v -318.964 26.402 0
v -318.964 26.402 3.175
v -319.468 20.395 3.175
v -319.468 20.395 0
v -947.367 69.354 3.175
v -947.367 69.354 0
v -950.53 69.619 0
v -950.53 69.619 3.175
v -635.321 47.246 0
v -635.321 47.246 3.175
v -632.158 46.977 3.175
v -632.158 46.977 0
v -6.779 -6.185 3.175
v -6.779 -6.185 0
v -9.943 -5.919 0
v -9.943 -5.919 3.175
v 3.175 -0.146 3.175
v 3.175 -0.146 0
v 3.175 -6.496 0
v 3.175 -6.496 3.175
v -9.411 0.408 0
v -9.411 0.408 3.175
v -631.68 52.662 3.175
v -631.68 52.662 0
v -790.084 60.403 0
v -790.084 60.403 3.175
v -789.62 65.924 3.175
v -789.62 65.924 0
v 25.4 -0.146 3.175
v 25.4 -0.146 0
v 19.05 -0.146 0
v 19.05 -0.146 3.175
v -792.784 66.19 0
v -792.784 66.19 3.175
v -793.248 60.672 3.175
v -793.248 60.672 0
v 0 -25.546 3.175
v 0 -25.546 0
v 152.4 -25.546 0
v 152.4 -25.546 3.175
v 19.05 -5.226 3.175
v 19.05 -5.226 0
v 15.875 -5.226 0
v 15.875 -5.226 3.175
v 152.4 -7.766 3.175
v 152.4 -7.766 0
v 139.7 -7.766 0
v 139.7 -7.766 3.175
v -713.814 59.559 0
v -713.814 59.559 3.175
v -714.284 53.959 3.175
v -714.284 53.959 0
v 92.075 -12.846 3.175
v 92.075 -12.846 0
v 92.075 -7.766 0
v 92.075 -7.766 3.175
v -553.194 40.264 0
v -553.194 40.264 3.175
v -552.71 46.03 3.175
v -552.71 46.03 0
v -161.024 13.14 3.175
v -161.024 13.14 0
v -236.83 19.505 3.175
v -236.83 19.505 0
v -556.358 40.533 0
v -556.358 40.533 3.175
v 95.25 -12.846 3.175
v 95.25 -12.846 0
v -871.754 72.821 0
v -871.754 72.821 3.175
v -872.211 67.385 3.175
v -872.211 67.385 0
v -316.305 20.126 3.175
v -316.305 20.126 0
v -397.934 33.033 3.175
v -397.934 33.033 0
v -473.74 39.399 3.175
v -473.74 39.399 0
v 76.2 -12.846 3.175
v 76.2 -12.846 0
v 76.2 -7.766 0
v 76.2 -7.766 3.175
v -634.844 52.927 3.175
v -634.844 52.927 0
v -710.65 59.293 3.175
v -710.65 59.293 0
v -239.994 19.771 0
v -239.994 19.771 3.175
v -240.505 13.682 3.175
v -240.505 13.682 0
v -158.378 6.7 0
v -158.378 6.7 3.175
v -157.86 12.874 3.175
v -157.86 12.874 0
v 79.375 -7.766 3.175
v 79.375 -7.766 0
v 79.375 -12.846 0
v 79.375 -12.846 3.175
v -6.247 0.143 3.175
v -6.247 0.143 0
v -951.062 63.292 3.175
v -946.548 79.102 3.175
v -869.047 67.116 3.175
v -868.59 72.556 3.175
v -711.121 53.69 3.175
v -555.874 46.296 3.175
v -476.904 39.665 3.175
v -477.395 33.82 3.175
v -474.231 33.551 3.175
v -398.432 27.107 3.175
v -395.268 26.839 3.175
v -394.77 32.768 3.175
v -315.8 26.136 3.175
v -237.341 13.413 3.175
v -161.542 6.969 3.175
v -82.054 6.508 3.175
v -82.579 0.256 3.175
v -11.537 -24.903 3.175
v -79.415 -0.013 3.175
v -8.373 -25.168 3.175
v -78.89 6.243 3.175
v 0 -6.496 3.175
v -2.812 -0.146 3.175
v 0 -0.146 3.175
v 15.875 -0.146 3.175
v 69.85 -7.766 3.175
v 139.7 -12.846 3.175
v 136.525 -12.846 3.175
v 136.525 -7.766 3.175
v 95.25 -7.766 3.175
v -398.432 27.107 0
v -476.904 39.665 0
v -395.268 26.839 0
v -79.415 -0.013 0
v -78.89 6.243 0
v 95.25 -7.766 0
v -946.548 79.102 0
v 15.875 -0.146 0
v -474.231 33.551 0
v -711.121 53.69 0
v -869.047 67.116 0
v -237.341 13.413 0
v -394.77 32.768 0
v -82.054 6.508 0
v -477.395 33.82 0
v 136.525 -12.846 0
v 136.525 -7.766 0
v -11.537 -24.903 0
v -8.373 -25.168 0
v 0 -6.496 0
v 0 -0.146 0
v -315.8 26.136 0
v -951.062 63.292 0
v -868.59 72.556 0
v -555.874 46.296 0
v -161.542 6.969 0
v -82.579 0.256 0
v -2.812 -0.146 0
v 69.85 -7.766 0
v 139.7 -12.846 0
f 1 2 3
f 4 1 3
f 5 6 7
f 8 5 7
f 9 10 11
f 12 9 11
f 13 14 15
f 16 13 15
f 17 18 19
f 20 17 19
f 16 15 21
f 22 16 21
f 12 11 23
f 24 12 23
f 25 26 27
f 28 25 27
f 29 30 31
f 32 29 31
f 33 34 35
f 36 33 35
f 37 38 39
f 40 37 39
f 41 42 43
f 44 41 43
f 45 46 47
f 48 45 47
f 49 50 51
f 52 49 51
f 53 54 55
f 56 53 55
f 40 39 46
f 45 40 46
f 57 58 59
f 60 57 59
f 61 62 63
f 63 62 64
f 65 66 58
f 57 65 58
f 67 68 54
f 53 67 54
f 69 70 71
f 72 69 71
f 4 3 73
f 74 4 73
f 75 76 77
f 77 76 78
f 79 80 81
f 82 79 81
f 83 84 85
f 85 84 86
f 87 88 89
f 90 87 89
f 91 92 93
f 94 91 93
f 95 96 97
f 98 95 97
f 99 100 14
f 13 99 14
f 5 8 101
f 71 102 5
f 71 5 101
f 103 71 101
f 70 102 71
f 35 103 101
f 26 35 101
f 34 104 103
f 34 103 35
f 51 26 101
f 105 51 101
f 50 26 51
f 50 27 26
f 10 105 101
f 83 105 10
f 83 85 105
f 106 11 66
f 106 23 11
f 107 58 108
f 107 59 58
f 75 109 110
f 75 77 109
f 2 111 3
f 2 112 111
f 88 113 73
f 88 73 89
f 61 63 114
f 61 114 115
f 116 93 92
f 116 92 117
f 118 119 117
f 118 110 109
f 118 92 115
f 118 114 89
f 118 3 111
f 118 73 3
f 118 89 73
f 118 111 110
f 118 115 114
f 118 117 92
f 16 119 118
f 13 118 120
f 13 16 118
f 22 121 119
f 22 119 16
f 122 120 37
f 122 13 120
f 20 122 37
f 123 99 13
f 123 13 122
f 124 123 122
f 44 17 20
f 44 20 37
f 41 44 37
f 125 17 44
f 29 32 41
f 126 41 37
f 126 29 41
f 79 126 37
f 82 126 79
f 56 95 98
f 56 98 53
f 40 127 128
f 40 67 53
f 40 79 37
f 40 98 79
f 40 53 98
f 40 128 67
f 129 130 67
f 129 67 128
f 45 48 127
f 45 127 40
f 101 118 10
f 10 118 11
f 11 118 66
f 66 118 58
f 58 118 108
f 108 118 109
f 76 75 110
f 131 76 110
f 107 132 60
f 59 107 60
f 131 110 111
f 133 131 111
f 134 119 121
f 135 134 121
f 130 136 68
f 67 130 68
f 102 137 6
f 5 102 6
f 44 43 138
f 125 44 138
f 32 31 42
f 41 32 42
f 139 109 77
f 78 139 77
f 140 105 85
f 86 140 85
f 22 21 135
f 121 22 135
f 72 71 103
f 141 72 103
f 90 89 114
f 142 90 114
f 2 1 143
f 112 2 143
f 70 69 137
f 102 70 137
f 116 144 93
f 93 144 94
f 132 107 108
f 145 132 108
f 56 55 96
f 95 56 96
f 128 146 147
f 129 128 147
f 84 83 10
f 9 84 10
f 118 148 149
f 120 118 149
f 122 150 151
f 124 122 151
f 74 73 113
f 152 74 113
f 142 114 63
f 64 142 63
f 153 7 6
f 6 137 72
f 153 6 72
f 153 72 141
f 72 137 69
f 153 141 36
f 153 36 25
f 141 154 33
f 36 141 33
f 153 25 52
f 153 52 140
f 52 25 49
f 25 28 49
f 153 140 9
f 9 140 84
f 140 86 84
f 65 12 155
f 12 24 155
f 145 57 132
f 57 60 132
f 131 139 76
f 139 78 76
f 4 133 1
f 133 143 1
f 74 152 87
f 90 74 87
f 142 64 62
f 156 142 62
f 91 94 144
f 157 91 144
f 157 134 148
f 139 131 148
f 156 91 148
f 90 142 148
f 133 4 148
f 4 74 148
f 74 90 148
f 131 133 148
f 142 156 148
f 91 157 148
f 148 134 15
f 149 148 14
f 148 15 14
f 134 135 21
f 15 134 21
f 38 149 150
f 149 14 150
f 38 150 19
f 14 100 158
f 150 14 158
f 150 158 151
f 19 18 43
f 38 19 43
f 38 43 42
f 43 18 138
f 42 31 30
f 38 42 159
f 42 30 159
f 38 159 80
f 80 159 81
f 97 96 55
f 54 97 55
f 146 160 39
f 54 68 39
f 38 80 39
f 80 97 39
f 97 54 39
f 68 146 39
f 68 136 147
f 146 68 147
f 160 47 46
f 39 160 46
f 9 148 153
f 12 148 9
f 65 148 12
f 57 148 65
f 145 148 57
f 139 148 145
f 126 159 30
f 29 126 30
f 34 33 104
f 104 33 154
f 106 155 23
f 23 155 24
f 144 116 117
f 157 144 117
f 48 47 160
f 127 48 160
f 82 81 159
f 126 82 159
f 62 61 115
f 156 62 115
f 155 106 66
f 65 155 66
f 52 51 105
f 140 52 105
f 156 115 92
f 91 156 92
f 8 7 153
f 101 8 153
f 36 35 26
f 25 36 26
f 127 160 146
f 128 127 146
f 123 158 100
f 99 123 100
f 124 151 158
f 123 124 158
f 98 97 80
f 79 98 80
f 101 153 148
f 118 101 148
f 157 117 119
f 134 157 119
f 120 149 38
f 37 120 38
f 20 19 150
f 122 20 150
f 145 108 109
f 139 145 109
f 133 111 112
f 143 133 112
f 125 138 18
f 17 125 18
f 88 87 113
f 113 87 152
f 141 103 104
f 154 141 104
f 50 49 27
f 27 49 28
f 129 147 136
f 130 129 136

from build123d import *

# Parameters (mm, degrees)
BOSS_EXTRUDE1_DEPTH = 3.175
CUT_EXTRUDE1_DEPTH  = 4.175


with BuildPart() as part:
    # Sketch1 → Boss-Extrude1 (new body)
    with BuildSketch(Plane.XY):
        Polygon((-950.530495659, 69.619322302), (-951.061849964, 63.291592645), (-11.536706102, -24.902638492), (-8.372841274, -25.168315645), (0, -25.545856054), (152.4, -25.545856054), (152.4, -7.765856054), (139.7, -7.765856054), (139.7, -12.845856054), (136.525, -12.845856054), (136.525, -7.765856054), (95.25, -7.765856054), (95.25, -12.845856054), (92.075, -12.845856054), (92.075, -7.765856054), (79.375, -7.765856054), (79.375, -12.845856054), (76.2, -12.845856054), (76.2, -7.765856054), (69.85, -7.765856054), (25.4, -0.145856054), (19.05, -0.145856054), (19.05, -5.225856054), (15.875, -5.225856054), (15.875, -0.145856054), (3.175, -0.145856054), (3.175, -6.495856054), (0, -6.495856054), (0, -0.145856054), (-2.81225704, -0.145856054), (-6.247424053, 0.14260298), (-6.778778359, -6.185126677), (-9.942643187, -5.919449524), (-9.411288881, 0.408280132), (-946.54805097, 79.101852726), (-947.366630831, 69.353645149), align=None)
    extrude(amount=BOSS_EXTRUDE1_DEPTH)

    # Sketch2 → Cut-Extrude1 (cut, through all)
    with BuildSketch(Plane.XY.offset(3.175)):
        Polygon((-79.415081651, -0.013332249), (-78.889760507, 6.242550403), (-82.053625335, 6.508227555), (-82.578671745, 0.255616625), align=None)
        Polygon((-158.378290396, 6.699631648), (-157.859826617, 12.873852131), (-161.023691445, 13.139529284), (-161.54188049, 6.968580522), align=None)
        Polygon((-237.341499142, 13.412595546), (-236.829892727, 19.50515386), (-239.993757555, 19.770831012), (-240.505089236, 13.68154442), align=None)
        Polygon((-316.304707888, 20.125559443), (-315.799958836, 26.136455588), (-318.963823664, 26.402132741), (-319.468297982, 20.394508317), align=None)
        Polygon((-395.267916634, 26.83852334), (-394.770024946, 32.767757316), (-397.933889774, 33.033434469), (-398.431506728, 27.107472214), align=None)
        Polygon((-474.23112538, 33.551487238), (-473.740091056, 39.399059045), (-476.903955884, 39.664736197), (-477.394715474, 33.820436112), align=None)
        Polygon((-553.194334126, 40.264451135), (-552.710157166, 46.030360773), (-555.874021994, 46.296037926), (-556.35792422, 40.533400009), align=None)
        Polygon((-632.157542872, 46.977415032), (-631.680223276, 52.661662502), (-634.844088104, 52.927339654), (-635.321132966, 47.246363906), align=None)
        Polygon((-711.120751618, 53.69037893), (-710.650289385, 59.29296423), (-713.814154213, 59.558641383), (-714.284341712, 53.959327804), align=None)
        Polygon((-790.083960364, 60.403342827), (-789.620355495, 65.924265958), (-792.784220323, 66.189943111), (-793.247550458, 60.672291701), align=None)
        Polygon((-869.047169109, 67.116306724), (-868.590421605, 72.555567687), (-871.754286433, 72.821244839), (-872.210759203, 67.385255598), align=None)
    extrude(amount=-CUT_EXTRUDE1_DEPTH, mode=Mode.SUBTRACT)


solid = part.part
